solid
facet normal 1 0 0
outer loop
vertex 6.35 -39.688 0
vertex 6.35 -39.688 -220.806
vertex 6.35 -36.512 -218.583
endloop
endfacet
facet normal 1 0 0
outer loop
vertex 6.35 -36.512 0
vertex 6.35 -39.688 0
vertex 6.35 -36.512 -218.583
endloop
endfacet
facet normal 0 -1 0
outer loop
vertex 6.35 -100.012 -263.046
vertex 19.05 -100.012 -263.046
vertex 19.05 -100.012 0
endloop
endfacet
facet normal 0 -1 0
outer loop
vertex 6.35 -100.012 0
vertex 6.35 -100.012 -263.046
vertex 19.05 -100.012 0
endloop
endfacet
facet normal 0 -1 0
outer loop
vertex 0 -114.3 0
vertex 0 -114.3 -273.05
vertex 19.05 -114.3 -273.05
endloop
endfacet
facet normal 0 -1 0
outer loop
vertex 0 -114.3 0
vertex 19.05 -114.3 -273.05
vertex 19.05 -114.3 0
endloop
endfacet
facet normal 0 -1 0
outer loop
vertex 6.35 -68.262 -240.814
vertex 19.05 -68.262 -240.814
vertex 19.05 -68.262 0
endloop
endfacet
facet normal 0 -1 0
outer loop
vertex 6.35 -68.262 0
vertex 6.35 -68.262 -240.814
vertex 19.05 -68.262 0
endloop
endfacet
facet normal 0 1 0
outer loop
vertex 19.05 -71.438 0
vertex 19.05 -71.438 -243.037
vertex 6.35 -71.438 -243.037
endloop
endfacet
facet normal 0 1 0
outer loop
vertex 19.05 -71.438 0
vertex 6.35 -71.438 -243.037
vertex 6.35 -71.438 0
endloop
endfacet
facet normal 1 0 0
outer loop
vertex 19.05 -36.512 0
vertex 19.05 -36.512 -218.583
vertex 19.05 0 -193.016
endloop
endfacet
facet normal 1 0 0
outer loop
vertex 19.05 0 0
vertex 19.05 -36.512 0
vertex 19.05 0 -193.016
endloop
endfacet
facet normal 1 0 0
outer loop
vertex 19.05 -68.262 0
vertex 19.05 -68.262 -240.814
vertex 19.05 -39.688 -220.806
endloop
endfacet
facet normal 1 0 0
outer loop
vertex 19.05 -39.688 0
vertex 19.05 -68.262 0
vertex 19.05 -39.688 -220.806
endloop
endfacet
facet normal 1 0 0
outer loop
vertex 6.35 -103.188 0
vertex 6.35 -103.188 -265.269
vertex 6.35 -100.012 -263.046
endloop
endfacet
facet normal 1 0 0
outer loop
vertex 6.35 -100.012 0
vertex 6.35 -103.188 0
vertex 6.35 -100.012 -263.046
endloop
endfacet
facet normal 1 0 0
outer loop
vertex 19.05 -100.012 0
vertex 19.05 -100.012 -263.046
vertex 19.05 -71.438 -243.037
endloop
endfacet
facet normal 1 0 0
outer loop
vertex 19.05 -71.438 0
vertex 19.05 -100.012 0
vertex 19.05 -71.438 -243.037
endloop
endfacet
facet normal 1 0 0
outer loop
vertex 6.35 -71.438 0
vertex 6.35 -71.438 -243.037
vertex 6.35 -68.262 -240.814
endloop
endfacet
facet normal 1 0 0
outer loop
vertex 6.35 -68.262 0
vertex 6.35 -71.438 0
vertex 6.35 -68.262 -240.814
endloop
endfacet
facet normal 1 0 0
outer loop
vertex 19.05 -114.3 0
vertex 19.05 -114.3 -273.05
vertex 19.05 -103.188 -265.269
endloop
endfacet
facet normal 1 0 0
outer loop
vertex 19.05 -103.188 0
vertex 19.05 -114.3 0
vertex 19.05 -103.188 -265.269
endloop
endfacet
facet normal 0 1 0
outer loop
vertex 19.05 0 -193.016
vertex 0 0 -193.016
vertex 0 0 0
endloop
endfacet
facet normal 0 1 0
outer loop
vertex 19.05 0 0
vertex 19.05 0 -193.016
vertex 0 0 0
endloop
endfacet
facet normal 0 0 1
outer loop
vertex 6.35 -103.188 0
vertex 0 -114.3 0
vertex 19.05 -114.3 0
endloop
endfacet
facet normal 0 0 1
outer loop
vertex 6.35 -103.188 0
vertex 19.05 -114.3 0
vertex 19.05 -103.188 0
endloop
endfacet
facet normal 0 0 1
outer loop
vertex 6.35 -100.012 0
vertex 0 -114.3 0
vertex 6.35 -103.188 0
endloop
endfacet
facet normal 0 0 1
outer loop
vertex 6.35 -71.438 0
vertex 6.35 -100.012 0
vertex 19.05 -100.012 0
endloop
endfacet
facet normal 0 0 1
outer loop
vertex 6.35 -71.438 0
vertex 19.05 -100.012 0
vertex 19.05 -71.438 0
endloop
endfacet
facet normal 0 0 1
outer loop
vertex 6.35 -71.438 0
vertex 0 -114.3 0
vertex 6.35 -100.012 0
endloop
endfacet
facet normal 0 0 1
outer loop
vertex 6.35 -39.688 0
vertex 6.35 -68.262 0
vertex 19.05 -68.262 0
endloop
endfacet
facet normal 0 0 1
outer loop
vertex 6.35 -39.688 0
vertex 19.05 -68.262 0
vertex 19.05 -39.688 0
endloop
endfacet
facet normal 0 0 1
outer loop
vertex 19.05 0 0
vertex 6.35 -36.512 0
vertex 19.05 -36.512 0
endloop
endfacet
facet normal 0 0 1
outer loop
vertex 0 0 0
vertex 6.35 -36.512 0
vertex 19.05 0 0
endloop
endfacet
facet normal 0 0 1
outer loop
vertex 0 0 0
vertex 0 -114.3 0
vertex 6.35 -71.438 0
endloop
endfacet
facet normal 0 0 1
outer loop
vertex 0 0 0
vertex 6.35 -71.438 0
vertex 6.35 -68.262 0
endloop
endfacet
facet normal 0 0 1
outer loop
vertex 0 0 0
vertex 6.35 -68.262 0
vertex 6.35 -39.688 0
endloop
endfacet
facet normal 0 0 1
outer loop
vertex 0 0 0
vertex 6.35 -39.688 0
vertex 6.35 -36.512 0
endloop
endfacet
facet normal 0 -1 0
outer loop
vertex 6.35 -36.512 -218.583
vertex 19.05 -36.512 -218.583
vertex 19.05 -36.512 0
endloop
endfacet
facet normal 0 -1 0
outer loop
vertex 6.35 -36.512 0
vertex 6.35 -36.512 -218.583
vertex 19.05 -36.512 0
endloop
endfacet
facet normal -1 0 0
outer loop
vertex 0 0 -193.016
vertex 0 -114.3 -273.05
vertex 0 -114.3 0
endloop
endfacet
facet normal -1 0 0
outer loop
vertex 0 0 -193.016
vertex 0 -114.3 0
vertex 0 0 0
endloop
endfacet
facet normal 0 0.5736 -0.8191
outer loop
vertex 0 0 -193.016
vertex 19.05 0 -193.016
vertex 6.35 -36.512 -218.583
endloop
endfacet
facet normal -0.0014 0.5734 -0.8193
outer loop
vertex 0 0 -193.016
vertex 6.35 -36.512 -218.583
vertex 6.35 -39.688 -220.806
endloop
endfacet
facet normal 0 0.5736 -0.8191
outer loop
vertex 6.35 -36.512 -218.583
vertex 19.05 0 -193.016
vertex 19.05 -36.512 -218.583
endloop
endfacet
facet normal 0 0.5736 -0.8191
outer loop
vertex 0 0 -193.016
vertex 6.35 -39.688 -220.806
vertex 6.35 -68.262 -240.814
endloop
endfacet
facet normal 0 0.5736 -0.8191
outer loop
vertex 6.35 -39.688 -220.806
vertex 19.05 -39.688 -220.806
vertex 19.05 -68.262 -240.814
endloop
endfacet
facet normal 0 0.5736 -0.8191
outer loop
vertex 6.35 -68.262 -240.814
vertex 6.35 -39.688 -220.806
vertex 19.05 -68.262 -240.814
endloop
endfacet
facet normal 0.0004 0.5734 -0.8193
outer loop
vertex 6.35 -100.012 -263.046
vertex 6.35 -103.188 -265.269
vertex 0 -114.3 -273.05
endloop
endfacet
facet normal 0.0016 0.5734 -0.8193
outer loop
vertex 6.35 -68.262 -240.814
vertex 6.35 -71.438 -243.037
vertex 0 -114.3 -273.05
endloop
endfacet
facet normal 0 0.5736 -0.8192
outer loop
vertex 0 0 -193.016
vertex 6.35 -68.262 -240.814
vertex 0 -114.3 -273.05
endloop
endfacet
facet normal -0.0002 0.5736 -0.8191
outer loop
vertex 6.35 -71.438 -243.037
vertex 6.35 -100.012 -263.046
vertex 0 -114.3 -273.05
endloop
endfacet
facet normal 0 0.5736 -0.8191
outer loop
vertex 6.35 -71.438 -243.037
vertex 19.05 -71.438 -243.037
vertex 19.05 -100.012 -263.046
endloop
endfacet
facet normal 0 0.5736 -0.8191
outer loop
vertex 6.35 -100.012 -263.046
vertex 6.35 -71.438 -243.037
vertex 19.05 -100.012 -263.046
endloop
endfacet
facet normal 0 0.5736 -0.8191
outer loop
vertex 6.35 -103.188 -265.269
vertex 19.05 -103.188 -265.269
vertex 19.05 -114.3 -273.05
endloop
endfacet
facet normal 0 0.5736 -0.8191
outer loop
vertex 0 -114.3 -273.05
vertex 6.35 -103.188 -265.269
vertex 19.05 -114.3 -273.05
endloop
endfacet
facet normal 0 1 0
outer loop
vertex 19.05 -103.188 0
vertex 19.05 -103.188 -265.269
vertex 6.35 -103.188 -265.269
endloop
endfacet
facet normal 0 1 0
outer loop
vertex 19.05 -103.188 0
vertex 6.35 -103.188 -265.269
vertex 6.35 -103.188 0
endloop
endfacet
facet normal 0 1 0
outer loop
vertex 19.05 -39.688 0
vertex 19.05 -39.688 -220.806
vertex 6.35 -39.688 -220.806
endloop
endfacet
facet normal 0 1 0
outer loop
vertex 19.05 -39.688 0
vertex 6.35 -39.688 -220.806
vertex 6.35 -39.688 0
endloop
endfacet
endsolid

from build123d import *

# Parameters (mm, degrees)
F0_W     = 114.3
F0_H     = 273.05
F1_DEPTH = 19.05
F2_W     = 3.175
F2_H     = 273.05
F3_DEPTH = 12.7
F5_DEPTH = 19.051


with BuildPart() as f1:
    # F0 (on Right) → F1 (new body)
    with BuildSketch(Plane.YZ):
        with Locations((-57.15, -136.525)):
            Rectangle(F0_W, F0_H)
    extrude(amount=F1_DEPTH)

    # F2 (on face) → F3 (cut)
    with BuildSketch(Plane.YZ.offset(19.05)):
        with Locations((-38.1, -136.525)):
            Rectangle(F2_W, F2_H)
        with Locations((-69.85, -136.525)):
            Rectangle(F2_W, F2_H)
        with Locations((-101.6, -136.525)):
            Rectangle(F2_W, F2_H)
    extrude(amount=-F3_DEPTH, mode=Mode.SUBTRACT)

    # F4 (on face) → F5 (cut, through all)
    with BuildSketch(Plane.YZ.offset(19.05)):
        Polygon((0, -193.016278), (-114.3, -273.05), (0, -273.05), align=None)
    extrude(amount=-F5_DEPTH, mode=Mode.SUBTRACT)


solid = f1.part
